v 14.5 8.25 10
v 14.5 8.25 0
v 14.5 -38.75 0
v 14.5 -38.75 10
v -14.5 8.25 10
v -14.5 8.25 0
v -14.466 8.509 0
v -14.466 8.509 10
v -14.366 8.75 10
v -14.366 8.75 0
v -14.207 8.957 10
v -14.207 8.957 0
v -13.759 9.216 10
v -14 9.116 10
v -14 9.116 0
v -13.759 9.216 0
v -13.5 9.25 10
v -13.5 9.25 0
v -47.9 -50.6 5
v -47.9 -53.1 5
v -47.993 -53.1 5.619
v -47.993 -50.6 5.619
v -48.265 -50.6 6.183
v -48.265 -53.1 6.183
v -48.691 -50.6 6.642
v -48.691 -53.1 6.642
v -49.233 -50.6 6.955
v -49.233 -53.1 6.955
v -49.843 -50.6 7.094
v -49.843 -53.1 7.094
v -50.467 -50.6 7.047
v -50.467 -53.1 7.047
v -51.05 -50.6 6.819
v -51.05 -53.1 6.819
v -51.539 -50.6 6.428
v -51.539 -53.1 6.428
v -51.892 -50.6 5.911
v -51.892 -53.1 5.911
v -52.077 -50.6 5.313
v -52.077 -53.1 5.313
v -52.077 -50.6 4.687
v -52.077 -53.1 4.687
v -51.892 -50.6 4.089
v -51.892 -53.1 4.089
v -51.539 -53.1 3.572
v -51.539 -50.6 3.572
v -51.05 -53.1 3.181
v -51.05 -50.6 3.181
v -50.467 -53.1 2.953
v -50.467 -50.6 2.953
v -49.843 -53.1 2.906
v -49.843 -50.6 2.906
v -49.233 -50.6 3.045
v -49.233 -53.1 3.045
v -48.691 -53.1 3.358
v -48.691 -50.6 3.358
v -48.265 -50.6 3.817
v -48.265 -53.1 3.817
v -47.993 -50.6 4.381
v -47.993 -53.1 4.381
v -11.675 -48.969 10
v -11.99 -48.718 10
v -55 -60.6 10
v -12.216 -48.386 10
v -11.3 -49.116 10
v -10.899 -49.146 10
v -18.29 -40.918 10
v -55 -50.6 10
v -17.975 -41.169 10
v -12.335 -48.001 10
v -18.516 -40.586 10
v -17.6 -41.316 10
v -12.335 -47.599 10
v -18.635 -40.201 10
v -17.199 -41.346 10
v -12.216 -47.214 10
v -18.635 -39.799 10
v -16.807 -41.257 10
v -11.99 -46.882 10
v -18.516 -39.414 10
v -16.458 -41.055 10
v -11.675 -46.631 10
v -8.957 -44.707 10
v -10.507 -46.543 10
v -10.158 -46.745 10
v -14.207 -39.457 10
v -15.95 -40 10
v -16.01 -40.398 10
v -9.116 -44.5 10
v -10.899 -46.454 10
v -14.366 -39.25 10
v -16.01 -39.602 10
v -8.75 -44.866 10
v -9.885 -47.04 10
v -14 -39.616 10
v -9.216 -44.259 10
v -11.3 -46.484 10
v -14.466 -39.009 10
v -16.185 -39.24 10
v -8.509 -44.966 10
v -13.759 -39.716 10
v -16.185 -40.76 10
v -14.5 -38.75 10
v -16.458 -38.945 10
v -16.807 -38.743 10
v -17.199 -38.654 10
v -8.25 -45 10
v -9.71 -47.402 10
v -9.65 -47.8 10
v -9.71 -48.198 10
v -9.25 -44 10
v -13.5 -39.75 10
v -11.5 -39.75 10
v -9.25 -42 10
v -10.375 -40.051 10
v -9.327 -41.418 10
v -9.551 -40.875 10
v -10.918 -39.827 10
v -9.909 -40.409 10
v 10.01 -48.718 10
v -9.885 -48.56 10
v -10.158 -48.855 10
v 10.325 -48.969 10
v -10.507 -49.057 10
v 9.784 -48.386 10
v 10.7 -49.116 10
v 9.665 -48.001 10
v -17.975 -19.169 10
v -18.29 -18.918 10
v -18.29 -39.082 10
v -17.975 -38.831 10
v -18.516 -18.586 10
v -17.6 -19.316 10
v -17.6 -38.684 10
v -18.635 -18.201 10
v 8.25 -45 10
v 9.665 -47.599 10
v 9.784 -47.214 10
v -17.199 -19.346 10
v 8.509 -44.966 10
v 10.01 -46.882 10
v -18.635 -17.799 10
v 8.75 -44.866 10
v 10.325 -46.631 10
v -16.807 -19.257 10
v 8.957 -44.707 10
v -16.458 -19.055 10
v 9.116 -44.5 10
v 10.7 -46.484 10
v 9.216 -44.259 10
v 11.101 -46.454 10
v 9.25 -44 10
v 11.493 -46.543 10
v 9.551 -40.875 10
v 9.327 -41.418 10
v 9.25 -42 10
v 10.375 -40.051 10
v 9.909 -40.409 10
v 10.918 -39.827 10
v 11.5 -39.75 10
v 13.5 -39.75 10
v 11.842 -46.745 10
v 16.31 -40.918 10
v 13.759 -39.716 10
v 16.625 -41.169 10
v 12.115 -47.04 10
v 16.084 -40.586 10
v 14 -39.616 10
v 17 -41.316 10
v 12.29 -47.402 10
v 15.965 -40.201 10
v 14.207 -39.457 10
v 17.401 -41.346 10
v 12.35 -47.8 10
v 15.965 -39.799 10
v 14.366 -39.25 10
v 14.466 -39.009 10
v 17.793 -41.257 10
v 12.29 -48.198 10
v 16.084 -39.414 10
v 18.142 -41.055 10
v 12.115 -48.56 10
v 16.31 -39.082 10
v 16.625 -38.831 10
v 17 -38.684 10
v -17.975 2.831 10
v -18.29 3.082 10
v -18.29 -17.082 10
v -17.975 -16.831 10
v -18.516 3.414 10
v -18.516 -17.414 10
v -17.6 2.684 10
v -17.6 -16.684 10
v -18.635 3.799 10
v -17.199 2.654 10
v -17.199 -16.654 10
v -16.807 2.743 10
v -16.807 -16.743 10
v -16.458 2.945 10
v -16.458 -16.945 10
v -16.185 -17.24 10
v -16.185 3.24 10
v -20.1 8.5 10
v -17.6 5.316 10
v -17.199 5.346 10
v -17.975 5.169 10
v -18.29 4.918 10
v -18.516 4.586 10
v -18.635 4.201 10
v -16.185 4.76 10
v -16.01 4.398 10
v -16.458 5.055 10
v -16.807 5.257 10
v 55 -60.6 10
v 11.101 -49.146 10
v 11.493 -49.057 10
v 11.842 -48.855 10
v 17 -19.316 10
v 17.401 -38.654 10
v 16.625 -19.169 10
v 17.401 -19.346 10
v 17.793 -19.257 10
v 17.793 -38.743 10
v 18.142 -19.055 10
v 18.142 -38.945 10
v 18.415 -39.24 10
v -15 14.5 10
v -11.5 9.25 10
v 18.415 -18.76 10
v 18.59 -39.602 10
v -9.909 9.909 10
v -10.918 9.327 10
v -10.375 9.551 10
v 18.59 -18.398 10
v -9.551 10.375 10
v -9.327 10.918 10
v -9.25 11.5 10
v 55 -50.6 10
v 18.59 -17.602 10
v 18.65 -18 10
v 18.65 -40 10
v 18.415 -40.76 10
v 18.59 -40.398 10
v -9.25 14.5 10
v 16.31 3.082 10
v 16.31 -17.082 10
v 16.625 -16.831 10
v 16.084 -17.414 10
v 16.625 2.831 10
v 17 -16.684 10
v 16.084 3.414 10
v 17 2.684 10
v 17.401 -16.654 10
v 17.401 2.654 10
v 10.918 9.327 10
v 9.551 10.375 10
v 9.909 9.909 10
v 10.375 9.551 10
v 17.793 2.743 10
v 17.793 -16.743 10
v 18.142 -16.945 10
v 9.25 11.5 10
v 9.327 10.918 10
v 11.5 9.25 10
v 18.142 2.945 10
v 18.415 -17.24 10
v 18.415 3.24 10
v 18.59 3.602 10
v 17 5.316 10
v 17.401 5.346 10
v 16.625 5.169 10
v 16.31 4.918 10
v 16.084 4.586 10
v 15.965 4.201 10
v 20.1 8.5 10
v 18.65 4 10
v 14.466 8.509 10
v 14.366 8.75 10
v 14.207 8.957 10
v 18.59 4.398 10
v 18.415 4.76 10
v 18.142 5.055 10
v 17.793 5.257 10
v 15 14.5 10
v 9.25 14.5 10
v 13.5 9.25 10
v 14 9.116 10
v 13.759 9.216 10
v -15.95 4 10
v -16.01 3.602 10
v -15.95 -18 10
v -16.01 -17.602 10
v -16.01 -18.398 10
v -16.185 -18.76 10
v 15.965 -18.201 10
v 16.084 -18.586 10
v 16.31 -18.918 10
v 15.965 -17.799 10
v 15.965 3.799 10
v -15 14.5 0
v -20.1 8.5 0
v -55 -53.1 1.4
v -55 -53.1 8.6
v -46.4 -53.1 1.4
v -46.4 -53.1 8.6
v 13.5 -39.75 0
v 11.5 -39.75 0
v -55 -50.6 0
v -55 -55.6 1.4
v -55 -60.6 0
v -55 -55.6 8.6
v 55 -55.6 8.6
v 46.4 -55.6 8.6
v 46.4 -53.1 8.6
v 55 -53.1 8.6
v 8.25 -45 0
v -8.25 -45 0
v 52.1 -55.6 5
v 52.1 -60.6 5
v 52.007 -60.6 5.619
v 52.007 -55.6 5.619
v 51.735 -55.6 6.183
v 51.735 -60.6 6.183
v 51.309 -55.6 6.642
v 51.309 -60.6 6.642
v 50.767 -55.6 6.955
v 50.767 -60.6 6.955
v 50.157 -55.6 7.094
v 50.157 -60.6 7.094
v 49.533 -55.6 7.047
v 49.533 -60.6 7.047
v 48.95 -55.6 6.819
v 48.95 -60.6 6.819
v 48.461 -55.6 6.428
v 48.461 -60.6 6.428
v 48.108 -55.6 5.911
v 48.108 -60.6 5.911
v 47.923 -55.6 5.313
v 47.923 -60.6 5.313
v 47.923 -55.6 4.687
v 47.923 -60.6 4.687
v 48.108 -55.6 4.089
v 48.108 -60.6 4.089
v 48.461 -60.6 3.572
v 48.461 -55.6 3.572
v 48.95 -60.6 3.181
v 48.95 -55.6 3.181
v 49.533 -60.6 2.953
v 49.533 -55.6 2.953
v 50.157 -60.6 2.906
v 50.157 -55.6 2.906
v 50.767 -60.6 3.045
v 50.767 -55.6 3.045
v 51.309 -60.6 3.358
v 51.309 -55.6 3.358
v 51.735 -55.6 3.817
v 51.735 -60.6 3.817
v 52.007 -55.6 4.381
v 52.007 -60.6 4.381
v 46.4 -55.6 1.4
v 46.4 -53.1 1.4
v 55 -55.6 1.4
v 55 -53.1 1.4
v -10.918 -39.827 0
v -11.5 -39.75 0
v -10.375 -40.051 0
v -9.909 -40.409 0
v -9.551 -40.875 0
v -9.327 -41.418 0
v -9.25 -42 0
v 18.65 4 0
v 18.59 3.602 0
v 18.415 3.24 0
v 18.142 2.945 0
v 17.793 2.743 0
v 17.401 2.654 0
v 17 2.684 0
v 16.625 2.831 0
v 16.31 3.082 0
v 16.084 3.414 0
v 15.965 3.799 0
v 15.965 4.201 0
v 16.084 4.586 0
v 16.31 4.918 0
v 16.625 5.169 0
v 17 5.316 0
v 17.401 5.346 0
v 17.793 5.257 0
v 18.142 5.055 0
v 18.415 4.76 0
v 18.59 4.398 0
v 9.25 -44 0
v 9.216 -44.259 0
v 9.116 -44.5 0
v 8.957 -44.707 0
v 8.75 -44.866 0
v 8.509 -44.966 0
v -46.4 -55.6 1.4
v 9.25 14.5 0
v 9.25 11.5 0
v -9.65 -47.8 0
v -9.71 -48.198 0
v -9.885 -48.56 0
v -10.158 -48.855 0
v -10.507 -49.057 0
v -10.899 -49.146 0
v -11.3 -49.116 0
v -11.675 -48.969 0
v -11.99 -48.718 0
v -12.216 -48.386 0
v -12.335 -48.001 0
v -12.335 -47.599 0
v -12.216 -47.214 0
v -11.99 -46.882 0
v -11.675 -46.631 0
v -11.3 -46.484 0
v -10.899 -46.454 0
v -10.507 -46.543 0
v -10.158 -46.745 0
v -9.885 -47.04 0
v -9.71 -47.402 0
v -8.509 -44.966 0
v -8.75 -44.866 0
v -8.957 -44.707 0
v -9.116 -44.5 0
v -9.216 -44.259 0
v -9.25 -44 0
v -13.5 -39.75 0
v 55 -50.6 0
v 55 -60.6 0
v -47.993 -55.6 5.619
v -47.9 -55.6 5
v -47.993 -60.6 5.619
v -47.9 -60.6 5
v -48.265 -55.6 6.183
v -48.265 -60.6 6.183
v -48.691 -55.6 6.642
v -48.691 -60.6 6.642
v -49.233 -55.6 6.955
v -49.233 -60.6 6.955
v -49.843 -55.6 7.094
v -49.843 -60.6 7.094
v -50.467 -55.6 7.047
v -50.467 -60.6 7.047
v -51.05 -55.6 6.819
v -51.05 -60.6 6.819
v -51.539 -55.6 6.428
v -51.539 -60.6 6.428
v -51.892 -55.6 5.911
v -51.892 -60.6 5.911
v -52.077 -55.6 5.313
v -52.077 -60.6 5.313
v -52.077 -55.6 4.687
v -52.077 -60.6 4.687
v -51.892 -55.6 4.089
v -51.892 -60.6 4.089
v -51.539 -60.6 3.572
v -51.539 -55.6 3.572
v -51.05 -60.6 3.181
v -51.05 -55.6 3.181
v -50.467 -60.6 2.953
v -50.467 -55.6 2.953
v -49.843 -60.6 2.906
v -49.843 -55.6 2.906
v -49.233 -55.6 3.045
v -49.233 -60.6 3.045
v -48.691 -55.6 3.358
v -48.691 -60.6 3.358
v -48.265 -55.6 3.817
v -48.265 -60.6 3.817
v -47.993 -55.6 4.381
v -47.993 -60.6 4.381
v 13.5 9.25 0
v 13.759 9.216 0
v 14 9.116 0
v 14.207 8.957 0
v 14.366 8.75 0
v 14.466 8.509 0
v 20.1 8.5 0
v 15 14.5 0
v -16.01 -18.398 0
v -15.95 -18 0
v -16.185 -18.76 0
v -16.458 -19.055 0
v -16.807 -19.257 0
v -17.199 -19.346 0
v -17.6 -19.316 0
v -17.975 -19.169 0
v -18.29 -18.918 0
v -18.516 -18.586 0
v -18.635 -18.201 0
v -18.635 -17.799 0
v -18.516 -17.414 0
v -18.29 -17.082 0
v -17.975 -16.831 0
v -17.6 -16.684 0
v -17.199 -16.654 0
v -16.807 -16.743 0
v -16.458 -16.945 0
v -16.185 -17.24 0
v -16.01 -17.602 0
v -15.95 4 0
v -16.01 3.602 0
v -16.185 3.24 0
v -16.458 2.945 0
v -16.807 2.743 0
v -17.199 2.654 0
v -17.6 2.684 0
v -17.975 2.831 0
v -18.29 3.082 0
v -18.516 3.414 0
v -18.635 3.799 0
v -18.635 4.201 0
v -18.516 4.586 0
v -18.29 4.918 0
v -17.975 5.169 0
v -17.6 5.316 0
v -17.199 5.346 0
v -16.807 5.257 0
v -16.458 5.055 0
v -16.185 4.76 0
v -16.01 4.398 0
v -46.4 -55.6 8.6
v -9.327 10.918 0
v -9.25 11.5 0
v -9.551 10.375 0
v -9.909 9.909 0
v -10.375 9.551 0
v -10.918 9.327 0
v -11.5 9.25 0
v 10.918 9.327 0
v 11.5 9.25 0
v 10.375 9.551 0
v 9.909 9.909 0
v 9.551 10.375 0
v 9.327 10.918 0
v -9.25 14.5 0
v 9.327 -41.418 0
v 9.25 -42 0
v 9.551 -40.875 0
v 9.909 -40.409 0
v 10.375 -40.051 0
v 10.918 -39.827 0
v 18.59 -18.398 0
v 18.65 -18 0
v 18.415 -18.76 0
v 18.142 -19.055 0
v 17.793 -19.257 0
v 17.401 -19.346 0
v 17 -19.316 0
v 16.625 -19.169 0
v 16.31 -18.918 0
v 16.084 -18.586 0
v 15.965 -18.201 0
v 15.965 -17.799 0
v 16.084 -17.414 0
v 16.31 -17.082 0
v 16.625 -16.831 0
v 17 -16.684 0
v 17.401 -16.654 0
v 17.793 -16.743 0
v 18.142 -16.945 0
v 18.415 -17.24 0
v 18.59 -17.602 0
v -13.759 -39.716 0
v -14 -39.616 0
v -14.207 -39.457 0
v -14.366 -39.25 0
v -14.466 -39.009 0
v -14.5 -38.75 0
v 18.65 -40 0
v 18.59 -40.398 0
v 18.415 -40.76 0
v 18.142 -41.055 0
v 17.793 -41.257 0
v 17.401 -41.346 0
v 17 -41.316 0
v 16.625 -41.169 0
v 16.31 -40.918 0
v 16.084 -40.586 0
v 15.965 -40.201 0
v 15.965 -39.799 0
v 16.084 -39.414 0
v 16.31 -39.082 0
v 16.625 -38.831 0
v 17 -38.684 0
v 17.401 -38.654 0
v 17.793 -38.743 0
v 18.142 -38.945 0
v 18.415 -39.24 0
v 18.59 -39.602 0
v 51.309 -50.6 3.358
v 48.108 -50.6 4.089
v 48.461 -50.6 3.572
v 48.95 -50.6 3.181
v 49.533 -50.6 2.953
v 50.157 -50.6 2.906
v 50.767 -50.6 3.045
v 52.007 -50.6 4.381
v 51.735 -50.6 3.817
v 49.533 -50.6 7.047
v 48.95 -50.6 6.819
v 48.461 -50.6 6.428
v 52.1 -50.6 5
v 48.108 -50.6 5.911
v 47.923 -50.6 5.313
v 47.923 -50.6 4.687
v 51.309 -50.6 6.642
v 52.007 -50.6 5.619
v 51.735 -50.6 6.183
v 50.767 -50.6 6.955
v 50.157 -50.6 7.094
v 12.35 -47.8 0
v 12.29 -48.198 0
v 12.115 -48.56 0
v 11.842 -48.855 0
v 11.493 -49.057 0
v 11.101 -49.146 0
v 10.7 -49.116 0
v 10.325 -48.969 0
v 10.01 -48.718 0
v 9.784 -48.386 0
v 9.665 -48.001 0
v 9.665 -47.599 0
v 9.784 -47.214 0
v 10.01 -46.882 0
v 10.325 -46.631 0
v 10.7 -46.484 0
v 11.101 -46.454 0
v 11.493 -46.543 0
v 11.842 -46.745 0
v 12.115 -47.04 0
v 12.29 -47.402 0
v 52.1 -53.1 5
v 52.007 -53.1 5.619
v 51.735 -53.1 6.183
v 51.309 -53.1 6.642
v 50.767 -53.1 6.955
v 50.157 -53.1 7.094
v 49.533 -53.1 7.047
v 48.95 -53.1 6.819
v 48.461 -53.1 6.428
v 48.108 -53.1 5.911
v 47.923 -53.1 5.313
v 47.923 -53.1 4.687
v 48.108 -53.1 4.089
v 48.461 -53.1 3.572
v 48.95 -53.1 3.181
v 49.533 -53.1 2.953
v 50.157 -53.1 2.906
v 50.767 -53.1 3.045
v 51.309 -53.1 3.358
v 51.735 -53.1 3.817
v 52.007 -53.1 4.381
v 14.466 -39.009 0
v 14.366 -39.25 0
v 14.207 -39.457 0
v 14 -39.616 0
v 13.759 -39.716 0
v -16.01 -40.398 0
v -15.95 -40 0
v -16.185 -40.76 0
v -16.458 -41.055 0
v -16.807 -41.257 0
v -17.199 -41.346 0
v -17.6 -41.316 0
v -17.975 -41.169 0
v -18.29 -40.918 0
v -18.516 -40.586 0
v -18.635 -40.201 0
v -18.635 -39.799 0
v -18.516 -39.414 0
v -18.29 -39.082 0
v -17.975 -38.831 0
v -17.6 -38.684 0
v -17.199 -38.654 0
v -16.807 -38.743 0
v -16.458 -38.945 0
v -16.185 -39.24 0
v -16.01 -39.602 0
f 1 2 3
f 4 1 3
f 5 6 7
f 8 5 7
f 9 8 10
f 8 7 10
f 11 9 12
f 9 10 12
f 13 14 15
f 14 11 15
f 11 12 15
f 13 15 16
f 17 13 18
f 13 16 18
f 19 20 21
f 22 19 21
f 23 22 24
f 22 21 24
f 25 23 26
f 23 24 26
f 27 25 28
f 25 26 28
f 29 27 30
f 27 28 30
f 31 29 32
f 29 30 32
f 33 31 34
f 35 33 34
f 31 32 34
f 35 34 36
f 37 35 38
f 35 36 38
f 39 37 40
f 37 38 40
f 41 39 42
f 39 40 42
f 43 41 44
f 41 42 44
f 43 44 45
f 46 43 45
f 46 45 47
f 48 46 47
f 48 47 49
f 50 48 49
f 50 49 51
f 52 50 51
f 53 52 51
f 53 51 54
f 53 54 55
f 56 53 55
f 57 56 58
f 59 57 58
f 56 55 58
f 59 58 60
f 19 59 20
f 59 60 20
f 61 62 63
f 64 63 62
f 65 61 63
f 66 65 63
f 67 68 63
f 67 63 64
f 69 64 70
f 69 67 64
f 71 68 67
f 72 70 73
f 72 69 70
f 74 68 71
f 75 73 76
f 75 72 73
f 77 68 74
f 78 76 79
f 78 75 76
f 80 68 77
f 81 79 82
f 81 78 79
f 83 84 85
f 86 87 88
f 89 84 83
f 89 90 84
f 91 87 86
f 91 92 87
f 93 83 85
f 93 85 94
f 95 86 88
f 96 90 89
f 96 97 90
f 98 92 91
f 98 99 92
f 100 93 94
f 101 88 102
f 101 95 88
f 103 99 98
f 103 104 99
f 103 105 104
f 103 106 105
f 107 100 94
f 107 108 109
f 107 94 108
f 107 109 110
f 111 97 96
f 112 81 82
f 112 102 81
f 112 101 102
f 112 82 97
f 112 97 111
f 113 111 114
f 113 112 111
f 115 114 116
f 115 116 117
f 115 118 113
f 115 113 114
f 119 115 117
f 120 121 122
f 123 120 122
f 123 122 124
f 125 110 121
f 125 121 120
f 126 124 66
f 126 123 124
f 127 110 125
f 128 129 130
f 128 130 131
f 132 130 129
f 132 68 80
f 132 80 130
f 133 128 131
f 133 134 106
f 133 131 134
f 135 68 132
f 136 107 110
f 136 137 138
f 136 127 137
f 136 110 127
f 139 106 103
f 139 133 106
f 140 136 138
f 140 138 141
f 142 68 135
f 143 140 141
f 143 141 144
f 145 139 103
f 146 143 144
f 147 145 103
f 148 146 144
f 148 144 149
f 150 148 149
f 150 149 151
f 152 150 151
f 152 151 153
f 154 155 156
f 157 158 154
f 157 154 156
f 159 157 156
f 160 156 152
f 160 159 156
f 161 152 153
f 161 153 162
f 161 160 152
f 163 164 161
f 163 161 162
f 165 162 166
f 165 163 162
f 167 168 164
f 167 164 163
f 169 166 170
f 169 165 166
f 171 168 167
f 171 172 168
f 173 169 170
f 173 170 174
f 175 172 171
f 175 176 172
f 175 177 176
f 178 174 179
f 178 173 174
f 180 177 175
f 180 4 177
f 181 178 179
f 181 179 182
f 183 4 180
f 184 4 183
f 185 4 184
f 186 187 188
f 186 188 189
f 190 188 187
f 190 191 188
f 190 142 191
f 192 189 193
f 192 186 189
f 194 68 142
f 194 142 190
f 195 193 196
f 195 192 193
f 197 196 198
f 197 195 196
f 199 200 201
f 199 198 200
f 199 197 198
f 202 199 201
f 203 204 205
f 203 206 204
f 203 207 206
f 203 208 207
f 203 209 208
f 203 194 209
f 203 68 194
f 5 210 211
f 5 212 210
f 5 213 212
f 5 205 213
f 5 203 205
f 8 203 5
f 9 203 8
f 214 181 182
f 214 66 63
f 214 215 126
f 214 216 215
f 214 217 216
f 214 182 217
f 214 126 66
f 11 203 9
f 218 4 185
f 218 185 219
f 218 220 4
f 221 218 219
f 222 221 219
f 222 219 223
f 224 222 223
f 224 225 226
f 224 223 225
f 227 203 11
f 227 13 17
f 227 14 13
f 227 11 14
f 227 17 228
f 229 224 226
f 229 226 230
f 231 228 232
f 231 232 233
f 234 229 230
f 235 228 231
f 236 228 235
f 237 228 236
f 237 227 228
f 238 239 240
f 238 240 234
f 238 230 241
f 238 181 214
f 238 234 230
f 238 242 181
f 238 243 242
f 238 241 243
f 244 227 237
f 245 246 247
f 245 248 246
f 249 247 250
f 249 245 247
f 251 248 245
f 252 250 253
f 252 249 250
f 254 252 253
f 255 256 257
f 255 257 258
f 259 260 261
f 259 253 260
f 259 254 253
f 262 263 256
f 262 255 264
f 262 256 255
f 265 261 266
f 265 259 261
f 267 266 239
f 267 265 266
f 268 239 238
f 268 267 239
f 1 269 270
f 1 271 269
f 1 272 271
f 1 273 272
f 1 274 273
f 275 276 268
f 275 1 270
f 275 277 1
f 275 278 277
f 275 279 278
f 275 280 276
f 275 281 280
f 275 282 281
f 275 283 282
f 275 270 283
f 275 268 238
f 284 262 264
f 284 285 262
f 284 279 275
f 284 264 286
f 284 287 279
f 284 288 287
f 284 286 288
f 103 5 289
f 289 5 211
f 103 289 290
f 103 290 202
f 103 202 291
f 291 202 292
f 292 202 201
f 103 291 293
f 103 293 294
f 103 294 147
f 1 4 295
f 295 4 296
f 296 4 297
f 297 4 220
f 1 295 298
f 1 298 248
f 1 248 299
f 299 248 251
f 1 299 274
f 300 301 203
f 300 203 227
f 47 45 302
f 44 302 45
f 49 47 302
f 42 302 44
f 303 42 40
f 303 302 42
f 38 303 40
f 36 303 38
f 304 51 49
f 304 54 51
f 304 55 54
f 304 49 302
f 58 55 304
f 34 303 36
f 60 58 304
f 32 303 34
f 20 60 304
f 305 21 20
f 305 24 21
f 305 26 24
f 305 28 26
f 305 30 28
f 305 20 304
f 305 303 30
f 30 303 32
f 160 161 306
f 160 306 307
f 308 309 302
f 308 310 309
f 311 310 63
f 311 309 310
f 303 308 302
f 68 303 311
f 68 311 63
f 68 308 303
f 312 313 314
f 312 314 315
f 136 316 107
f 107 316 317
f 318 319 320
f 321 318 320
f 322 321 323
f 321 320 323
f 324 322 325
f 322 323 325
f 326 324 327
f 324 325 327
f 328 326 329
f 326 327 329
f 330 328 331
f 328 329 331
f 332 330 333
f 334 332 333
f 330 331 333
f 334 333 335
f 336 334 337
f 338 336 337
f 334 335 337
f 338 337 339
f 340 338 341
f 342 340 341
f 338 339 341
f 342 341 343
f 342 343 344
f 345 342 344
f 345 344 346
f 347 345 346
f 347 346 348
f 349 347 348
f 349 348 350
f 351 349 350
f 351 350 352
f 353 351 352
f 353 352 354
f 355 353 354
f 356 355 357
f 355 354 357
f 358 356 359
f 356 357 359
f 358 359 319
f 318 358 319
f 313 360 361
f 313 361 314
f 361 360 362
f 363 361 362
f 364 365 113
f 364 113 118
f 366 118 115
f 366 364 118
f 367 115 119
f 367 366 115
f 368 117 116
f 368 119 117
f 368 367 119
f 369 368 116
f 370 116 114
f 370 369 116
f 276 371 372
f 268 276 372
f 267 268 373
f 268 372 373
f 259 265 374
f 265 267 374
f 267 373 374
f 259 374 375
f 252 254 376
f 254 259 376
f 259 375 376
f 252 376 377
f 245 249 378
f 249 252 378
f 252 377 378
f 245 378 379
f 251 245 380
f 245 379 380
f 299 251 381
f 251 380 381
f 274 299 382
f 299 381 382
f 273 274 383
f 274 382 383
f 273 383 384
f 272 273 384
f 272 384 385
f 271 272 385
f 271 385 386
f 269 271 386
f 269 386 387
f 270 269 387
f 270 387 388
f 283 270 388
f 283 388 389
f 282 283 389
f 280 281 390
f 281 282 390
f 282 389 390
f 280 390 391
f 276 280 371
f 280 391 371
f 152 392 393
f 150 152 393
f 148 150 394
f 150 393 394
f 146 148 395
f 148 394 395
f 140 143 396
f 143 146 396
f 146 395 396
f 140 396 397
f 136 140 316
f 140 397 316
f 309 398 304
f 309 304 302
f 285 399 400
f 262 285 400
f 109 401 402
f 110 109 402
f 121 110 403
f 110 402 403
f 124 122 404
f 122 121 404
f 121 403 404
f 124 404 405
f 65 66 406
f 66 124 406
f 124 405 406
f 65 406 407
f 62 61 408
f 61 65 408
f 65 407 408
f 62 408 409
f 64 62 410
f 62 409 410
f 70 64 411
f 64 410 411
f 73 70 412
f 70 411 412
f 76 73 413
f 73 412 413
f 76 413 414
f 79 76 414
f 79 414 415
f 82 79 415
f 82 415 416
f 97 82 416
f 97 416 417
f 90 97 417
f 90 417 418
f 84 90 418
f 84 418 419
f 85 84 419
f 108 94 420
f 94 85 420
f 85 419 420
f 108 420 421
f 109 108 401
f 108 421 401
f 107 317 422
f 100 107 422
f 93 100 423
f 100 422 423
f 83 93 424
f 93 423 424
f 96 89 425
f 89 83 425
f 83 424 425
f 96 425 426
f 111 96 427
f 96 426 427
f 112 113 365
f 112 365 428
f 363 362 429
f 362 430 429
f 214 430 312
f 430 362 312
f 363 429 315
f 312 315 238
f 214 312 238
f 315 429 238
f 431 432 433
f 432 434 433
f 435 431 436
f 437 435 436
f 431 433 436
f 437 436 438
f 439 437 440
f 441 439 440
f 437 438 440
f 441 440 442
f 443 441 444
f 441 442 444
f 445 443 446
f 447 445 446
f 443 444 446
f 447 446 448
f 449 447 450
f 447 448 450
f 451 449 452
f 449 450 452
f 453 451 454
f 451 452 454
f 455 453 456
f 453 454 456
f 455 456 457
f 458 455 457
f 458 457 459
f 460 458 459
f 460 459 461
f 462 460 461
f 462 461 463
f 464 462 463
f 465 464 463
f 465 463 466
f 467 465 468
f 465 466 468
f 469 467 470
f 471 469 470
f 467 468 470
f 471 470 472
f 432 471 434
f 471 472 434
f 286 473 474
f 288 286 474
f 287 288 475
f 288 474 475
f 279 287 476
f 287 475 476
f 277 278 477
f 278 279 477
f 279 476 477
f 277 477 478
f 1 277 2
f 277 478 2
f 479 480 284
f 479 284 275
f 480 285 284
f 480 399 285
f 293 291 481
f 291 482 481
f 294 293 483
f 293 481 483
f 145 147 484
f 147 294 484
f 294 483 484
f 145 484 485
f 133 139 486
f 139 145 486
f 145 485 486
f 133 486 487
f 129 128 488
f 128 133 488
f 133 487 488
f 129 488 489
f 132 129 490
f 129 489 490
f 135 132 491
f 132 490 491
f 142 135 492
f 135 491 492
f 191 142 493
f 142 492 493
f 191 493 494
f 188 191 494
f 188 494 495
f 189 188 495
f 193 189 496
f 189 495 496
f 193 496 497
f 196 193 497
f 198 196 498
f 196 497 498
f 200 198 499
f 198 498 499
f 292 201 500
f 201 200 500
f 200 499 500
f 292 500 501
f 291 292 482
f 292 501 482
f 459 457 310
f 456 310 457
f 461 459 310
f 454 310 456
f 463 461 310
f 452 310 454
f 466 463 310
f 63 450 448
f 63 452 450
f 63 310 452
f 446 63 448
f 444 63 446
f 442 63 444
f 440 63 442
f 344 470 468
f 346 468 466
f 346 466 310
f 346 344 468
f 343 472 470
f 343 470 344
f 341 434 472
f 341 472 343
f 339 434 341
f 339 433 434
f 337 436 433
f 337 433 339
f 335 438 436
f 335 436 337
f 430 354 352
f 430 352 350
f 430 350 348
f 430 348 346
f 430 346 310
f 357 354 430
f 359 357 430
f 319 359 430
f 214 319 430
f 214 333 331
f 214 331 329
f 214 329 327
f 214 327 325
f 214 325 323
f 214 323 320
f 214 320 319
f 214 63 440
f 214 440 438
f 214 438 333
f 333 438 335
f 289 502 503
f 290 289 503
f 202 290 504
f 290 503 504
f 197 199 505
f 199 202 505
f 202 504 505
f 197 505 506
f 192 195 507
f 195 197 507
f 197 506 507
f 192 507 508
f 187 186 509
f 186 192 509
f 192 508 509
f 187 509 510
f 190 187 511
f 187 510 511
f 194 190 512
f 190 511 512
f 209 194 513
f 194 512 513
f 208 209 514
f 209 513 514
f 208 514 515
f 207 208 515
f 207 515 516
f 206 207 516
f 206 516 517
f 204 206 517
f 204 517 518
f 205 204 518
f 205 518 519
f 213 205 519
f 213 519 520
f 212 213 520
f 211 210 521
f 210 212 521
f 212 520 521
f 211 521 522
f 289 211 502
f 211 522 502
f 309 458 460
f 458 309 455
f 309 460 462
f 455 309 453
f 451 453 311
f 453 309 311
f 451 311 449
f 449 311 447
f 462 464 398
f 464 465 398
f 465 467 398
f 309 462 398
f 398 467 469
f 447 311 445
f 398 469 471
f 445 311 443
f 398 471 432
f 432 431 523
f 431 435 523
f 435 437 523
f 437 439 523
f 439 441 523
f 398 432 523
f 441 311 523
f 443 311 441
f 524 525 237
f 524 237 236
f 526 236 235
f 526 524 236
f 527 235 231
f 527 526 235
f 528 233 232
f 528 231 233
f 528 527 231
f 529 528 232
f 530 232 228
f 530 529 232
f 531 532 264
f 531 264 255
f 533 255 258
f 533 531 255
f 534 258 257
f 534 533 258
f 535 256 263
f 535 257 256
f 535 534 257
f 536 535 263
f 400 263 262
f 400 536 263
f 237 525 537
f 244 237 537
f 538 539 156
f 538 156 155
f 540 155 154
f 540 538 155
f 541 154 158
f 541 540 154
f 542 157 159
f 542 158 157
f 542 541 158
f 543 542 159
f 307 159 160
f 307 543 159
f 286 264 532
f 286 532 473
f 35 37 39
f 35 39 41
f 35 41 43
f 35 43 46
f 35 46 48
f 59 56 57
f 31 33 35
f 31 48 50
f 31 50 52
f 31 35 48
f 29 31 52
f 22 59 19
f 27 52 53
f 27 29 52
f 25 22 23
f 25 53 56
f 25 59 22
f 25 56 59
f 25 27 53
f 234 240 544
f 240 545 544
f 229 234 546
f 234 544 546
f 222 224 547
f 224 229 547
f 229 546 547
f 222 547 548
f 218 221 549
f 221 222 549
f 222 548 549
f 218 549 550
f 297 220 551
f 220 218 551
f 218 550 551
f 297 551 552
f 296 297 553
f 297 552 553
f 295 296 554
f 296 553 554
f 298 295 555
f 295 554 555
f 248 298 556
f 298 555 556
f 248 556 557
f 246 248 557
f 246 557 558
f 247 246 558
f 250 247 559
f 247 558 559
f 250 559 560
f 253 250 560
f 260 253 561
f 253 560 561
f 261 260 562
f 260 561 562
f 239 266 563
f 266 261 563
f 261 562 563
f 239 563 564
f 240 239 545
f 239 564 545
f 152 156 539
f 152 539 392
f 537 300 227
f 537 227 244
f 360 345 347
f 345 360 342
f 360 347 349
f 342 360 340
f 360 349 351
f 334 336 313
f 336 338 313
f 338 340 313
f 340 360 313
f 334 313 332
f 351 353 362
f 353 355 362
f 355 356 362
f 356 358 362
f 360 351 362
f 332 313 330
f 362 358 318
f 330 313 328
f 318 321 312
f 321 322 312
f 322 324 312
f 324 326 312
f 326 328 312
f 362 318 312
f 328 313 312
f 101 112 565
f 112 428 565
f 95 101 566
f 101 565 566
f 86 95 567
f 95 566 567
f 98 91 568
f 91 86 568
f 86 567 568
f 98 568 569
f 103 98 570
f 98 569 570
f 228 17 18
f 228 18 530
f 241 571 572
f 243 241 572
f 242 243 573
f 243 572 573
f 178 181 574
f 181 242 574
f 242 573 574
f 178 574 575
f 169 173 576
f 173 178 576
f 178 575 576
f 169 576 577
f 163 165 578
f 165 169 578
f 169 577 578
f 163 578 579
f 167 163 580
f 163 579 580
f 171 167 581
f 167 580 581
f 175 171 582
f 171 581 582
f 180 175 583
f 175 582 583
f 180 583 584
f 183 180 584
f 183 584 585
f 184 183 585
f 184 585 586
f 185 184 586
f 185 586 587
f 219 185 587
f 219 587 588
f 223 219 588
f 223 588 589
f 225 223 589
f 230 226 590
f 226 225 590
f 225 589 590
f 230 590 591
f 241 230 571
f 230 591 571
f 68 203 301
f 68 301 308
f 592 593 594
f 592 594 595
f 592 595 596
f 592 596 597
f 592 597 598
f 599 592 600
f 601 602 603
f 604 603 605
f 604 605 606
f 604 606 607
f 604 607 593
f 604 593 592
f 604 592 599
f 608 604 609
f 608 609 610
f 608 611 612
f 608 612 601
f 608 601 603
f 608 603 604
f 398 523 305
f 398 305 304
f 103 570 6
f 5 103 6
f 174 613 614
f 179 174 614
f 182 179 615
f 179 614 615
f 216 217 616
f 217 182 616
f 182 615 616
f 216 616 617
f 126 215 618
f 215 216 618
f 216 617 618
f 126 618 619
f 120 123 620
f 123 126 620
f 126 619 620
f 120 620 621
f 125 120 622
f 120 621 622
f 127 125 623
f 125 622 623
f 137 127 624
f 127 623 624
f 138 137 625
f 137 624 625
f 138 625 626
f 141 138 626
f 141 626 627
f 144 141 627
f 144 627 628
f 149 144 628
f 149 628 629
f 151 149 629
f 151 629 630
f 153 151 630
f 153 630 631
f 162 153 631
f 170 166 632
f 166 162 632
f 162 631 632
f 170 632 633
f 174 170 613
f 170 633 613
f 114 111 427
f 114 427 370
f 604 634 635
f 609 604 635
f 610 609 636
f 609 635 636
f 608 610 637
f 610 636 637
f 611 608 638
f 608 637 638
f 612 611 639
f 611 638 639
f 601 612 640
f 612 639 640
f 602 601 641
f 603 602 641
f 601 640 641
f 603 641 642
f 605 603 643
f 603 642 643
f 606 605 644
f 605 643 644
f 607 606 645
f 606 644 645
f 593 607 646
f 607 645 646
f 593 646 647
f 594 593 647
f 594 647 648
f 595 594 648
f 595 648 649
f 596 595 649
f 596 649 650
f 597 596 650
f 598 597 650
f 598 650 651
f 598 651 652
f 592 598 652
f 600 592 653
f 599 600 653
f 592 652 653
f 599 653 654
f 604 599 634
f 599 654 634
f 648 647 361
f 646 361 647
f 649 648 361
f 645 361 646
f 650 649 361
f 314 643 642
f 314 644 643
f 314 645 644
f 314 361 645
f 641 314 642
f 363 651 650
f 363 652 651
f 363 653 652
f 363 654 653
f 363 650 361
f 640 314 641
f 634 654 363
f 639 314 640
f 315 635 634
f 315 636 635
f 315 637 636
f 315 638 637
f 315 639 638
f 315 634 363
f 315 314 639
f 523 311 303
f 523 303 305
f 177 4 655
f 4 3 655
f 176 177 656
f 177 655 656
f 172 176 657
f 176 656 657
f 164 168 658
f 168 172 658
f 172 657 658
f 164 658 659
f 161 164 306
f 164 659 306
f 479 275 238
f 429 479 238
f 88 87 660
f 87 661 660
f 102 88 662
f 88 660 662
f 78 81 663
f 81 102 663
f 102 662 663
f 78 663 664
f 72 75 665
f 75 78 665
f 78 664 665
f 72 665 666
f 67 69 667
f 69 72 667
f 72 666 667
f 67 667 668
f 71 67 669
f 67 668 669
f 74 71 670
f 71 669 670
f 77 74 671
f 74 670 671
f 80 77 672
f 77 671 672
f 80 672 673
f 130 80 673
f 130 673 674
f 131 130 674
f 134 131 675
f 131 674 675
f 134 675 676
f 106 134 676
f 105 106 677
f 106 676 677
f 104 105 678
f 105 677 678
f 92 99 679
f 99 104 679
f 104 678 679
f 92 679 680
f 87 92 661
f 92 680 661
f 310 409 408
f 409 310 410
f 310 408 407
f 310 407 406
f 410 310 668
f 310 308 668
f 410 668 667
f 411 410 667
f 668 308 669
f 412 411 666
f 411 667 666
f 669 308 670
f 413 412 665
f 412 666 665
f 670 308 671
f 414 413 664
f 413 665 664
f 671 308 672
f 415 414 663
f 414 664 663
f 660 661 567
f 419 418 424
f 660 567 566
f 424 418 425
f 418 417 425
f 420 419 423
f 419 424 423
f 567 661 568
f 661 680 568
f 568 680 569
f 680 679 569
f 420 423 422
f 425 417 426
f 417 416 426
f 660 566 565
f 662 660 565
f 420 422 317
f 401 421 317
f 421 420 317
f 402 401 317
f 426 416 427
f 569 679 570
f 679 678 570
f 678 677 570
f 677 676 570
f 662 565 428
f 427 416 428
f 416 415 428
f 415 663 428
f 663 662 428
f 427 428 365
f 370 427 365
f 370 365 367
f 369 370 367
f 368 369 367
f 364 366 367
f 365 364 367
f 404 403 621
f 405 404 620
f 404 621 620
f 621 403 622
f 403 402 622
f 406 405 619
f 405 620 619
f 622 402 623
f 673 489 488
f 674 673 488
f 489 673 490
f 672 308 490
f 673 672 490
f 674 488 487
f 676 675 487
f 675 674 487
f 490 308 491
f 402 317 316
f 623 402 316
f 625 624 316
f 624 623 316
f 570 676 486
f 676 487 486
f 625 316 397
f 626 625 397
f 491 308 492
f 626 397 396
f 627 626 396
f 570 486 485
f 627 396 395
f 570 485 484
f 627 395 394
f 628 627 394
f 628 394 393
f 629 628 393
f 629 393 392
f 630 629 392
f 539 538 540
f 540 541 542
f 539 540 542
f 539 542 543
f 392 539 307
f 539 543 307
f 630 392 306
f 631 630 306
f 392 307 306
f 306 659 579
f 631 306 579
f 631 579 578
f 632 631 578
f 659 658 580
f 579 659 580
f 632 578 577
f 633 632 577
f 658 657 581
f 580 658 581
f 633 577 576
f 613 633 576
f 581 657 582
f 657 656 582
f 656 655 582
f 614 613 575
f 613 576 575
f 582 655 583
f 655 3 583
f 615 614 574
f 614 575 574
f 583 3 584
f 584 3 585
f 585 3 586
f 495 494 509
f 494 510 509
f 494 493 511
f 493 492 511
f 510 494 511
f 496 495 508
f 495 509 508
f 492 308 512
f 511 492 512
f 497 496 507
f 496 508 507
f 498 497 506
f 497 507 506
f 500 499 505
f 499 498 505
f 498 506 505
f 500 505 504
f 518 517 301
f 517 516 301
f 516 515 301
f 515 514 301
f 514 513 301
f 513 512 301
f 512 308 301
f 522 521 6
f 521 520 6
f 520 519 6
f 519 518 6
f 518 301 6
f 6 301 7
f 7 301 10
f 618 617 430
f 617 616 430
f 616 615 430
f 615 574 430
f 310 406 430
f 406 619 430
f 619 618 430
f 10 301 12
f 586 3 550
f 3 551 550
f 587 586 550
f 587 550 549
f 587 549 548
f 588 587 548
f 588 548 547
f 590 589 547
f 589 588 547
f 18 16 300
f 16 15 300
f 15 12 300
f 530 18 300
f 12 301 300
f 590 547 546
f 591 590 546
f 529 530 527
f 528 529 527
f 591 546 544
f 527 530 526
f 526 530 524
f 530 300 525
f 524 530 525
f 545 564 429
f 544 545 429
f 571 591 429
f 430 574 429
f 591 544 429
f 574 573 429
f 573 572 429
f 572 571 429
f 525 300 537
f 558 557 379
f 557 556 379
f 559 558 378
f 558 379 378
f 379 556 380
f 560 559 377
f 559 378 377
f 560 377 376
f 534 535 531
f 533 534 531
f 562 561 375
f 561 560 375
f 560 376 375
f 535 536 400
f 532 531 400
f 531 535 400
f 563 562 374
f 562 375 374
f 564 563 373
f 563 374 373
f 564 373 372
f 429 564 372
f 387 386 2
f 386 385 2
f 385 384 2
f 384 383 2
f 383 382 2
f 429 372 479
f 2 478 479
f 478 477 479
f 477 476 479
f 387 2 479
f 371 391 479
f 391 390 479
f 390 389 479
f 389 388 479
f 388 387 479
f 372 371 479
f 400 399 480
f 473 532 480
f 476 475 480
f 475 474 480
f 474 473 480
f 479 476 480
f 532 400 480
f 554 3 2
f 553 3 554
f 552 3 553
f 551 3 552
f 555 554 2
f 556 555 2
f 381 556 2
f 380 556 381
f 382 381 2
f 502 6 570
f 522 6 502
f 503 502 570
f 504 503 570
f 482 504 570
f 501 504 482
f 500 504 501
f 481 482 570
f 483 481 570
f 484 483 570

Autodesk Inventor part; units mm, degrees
ref_plane "YZ Plane" through (0, 0, 0) normal (1, 0, 0) x (0, 1, 0)
ref_plane "XZ Plane" through (0, 0, 0) normal (0, 1, 0) x (-1, 0, 0)
ref_plane "XY Plane" through (0, 0, 0) normal (0, 0, 1) x (1, 0, 0)
sketch "Sketch1" plane through (0, 0, 0) normal (0, 0, 1) x (1, 0, 0)
  line L0 (13.5, -39.75) -> (11.5, -39.75) projected
  arc A0 (11.5, -39.75) -> (9.25, -42) centre (11.5, -42) ccw projected
  line L1 (9.25, -42) -> (9.25, -44) projected
  arc A1 (8.25, -45) -> (9.25, -44) centre (8.25, -44) ccw projected
  line L2 (8.25, -45) -> (-8.25, -45) projected
  arc A2 (-9.25, -44) -> (-8.25, -45) centre (-8.25, -44) ccw projected
  line L3 (-9.25, -44) -> (-9.25, -42) projected
  arc A3 (-9.25, -42) -> (-11.5, -39.75) centre (-11.5, -42) ccw projected
  line L4 (-11.5, -39.75) -> (-13.5, -39.75) projected
  arc A4 (-14.5, -38.75) -> (-13.5, -39.75) centre (-13.5, -38.75) ccw projected
  line L5 (-14.5, -38.75) -> (-14.5, 8.25) projected
  arc A5 (-13.5, 9.25) -> (-14.5, 8.25) centre (-13.5, 8.25) ccw projected
  line L6 (-13.5, 9.25) -> (-11.5, 9.25) projected
  arc A6 (-11.5, 9.25) -> (-9.25, 11.5) centre (-11.5, 11.5) ccw projected
  line L7 (-9.25, 11.5) -> (-9.25, 14.5) projected
  line L8 (-15, 14.5) -> (-9.25, 14.5) projected
  line L9 (-20.1, 8.5) -> (-15, 14.5) projected
  line L10 (-20.1, -44.6) -> (-20.1, 8.5) projected
  line L11 (-15, -50.6) -> (-20.1, -44.6) projected
  line L12 (15, -50.6) -> (-15, -50.6) projected
  line L13 (20.1, -44.6) -> (15, -50.6) projected
  line L14 (20.1, 8.5) -> (20.1, -44.6) projected
  line L15 (15, 14.5) -> (20.1, 8.5) projected
  line L16 (9.25, 14.5) -> (15, 14.5) projected
  line L17 (9.25, 14.5) -> (9.25, 11.5) projected
  arc A7 (9.25, 11.5) -> (11.5, 9.25) centre (11.5, 11.5) ccw projected
  line L18 (11.5, 9.25) -> (13.5, 9.25) projected
  arc A8 (14.5, 8.25) -> (13.5, 9.25) centre (13.5, 8.25) ccw projected
  line L19 (14.5, 8.25) -> (14.5, -38.75) projected
  arc A9 (13.5, -39.75) -> (14.5, -38.75) centre (13.5, -38.75) ccw projected
  circle A10 centre (17.3, 4) radius 1.35 projected
  circle A11 centre (17.3, -18) radius 1.35 projected
  circle A12 centre (11, -47.8) radius 1.35 projected
  circle A13 centre (-17.3, 4) radius 1.35 projected
  circle A14 centre (-17.3, -18) radius 1.35 projected
  circle A15 centre (-11, -47.8) radius 1.35 projected
  circle A16 centre (17.3, -40) radius 1.35 projected
  circle A17 centre (-17.3, -40) radius 1.35 projected
  point P0 (0, 0)
extrude "Extrusion1" add sketch "Sketch1" along normal blind 10
sketch "Sketch2" plane through (-15, -50.6, 0) normal (0, -1, 0) x (1, 0, 0)
  line L0 (0, 0) -> (30, 0) projected
  line L1 (30, 0) -> (30, 10) projected
  line L2 (0, 10) -> (30, 10) projected
  line L3 (0, 0) -> (0, 10) projected
  line L4 (15, 0) -> (70, 0)
  line L5 (70, 0) -> (70, 10)
  line L6 (70, 10) -> (15, 10)
  line L7 (15, 10) -> (15, 0)
  line L8 (15, 0) -> (-40, 0)
  line L9 (-40, 0) -> (-40, 10)
  line L10 (-40, 10) -> (15, 10)
  line L11 (15, 10) -> (15, 0)
  dimension "d2" = 55
  dimension "d3" = 10
  dimension "d4" = 55
  dimension "d5" = 10
extrude "Extrusion2" add sketch "Sketch2" along normal blind 10
sketch "Sketch3" plane through (0, 0, 10) normal (0, 0, 1) x (1, 0, 0)
  circle A0 centre (-17.3, -40) radius 1.35 projected
  circle A1 centre (17.3, -40) radius 1.35 projected
  circle A2 centre (-11, -47.8) radius 1.35 projected
  circle A3 centre (-17.3, -18) radius 1.35 projected
  circle A4 centre (-17.3, 4) radius 1.35 projected
  circle A5 centre (11, -47.8) radius 1.35 projected
  circle A6 centre (17.3, -18) radius 1.35 projected
  circle A7 centre (17.3, 4) radius 1.35 projected
  line L0 (13.5, -39.75) -> (11.5, -39.75) projected
  arc A8 (11.5, -39.75) -> (9.25, -42) centre (11.5, -42) ccw projected
  line L1 (9.25, -42) -> (9.25, -44) projected
  arc A9 (8.25, -45) -> (9.25, -44) centre (8.25, -44) ccw projected
  line L2 (8.25, -45) -> (-8.25, -45) projected
  arc A10 (-9.25, -44) -> (-8.25, -45) centre (-8.25, -44) ccw projected
  line L3 (-9.25, -44) -> (-9.25, -42) projected
  arc A11 (-9.25, -42) -> (-11.5, -39.75) centre (-11.5, -42) ccw projected
  line L4 (-11.5, -39.75) -> (-13.5, -39.75) projected
  arc A12 (-14.5, -38.75) -> (-13.5, -39.75) centre (-13.5, -38.75) ccw projected
  line L5 (-14.5, -38.75) -> (-14.5, 8.25) projected
  arc A13 (-13.5, 9.25) -> (-14.5, 8.25) centre (-13.5, 8.25) ccw projected
  line L6 (-13.5, 9.25) -> (-11.5, 9.25) projected
  arc A14 (-11.5, 9.25) -> (-9.25, 11.5) centre (-11.5, 11.5) ccw projected
  line L7 (-9.25, 11.5) -> (-9.25, 14.5) projected
  line L8 (-9.25, 14.5) -> (-15, 14.5) projected
  line L9 (-15, 14.5) -> (-20.1, 8.5) projected
  line L10 (-20.1, 8.5) -> (-20.1, -44.6) projected
  line L11 (-20.1, -44.6) -> (-15, -50.6) projected
  line L12 (-15, -50.6) -> (-55, -50.6) projected
  line L13 (-55, -50.6) -> (-55, -60.6) projected
  line L14 (55, -60.6) -> (-55, -60.6) projected
  line L15 (55, -50.6) -> (55, -60.6) projected
  line L16 (55, -50.6) -> (15, -50.6) projected
  line L17 (15, -50.6) -> (20.1, -44.6) projected
  line L18 (20.1, -44.6) -> (20.1, 8.5) projected
  line L19 (20.1, 8.5) -> (15, 14.5) projected
  line L20 (15, 14.5) -> (9.25, 14.5) projected
  line L21 (9.25, 14.5) -> (9.25, 11.5) projected
  arc A15 (9.25, 11.5) -> (11.5, 9.25) centre (11.5, 11.5) ccw projected
  line L22 (11.5, 9.25) -> (13.5, 9.25) projected
  arc A16 (14.5, 8.25) -> (13.5, 9.25) centre (13.5, 8.25) ccw projected
  line L23 (14.5, 8.25) -> (14.5, -38.75) projected
  arc A17 (13.5, -39.75) -> (14.5, -38.75) centre (13.5, -38.75) ccw projected
  line L24 (-20.1, 8.5) -> (-55, -50.6)
  line L25 (20.1, -44.6) -> (20.1, 8.5) projected
  line L26 (15, -50.6) -> (55, -50.6) projected
  line L27 (20.1, 8.5) -> (55, -50.6)
  point P0 (0, 0)
extrude "Extrusion3" add sketch "Sketch3" against normal blind 10 contours L27 L16 L17 L18 | L24 L10 L11 L12
sketch "Sketch4" plane through (-15, -60.6, 0) normal (0, -1, 0) x (1, 0, 0)
  line L0 (15, 0) -> (15, 5)
  line L1 (15, 0) -> (20, 0) construction
  line L2 (15, 5) -> (-35, 5)
  line L3 (15, 5) -> (65, 5)
  line L4 (15, 5) -> (65, 5) construction
  circle A0 centre (-35, 5) radius 2.1
  circle A1 centre (65, 5) radius 2.1
  dimension "d10" = 5
  dimension "d11" = 90
  dimension "d12" = 50
  dimension "d13" = 90
  dimension "d14" = 50
  dimension "d15" = 0
  dimension "d16" = 4.2
  dimension "d17" = 4.2
extrude "Extrusion4" cut sketch "Sketch4" against normal blind 10
ref_plane "Work Plane1" through (-15, -55.6, 0) normal (0, -1, 0) x (1, 0, 0)
sketch "Sketch5" plane through (-15, -55.6, 0) normal (0, -1, 0) x (1, 0, 0)
  circle A0 centre (-35, 5) radius 2.1 projected
  circle A1 centre (65, 5) radius 2.1 projected
  line L0 (-38.6, 8.6) -> (-31.4, 8.6)
  line L1 (-31.4, 8.6) -> (-31.4, 1.4)
  line L2 (-31.4, 1.4) -> (-38.6, 1.4)
  line L3 (-38.6, 1.4) -> (-38.6, 8.6)
  line L4 (-38.6, 8.6) -> (-31.4, 1.4)
  line L5 (-31.4, 8.6) -> (-38.6, 1.4)
  line L6 (61.4, 8.6) -> (68.6, 8.6)
  line L7 (68.6, 8.6) -> (68.6, 1.4)
  line L8 (68.6, 1.4) -> (61.4, 1.4)
  line L9 (61.4, 1.4) -> (61.4, 8.6)
  line L10 (61.4, 8.6) -> (68.6, 1.4)
  line L11 (68.6, 8.6) -> (61.4, 1.4)
  line L12 (70, 0) -> (70, 10) projected
  line L13 (68.6, 1.4) -> (70, 1.4)
  line L14 (70, 1.4) -> (70, 8.6)
  line L15 (70, 8.6) -> (68.6, 8.6)
  line L16 (68.6, 8.6) -> (68.6, 1.4)
  line L17 (-40, 10) -> (-40, 0) construction
  line L18 (-38.6, 8.6) -> (-40, 8.6)
  line L19 (-40, 8.6) -> (-40, 1.4)
  line L20 (-40, 1.4) -> (-38.6, 1.4)
  line L21 (-38.6, 1.4) -> (-38.6, 8.6)
  point P0 (15, 0)
  dimension "d21" = 7.2
  dimension "d22" = 7.2
  dimension "d23" = 7.2
  dimension "d24" = 7.2
extrude "Extrusion5" cut sketch "Sketch5" against normal blind 2.5
properties part number "motor_mount"
